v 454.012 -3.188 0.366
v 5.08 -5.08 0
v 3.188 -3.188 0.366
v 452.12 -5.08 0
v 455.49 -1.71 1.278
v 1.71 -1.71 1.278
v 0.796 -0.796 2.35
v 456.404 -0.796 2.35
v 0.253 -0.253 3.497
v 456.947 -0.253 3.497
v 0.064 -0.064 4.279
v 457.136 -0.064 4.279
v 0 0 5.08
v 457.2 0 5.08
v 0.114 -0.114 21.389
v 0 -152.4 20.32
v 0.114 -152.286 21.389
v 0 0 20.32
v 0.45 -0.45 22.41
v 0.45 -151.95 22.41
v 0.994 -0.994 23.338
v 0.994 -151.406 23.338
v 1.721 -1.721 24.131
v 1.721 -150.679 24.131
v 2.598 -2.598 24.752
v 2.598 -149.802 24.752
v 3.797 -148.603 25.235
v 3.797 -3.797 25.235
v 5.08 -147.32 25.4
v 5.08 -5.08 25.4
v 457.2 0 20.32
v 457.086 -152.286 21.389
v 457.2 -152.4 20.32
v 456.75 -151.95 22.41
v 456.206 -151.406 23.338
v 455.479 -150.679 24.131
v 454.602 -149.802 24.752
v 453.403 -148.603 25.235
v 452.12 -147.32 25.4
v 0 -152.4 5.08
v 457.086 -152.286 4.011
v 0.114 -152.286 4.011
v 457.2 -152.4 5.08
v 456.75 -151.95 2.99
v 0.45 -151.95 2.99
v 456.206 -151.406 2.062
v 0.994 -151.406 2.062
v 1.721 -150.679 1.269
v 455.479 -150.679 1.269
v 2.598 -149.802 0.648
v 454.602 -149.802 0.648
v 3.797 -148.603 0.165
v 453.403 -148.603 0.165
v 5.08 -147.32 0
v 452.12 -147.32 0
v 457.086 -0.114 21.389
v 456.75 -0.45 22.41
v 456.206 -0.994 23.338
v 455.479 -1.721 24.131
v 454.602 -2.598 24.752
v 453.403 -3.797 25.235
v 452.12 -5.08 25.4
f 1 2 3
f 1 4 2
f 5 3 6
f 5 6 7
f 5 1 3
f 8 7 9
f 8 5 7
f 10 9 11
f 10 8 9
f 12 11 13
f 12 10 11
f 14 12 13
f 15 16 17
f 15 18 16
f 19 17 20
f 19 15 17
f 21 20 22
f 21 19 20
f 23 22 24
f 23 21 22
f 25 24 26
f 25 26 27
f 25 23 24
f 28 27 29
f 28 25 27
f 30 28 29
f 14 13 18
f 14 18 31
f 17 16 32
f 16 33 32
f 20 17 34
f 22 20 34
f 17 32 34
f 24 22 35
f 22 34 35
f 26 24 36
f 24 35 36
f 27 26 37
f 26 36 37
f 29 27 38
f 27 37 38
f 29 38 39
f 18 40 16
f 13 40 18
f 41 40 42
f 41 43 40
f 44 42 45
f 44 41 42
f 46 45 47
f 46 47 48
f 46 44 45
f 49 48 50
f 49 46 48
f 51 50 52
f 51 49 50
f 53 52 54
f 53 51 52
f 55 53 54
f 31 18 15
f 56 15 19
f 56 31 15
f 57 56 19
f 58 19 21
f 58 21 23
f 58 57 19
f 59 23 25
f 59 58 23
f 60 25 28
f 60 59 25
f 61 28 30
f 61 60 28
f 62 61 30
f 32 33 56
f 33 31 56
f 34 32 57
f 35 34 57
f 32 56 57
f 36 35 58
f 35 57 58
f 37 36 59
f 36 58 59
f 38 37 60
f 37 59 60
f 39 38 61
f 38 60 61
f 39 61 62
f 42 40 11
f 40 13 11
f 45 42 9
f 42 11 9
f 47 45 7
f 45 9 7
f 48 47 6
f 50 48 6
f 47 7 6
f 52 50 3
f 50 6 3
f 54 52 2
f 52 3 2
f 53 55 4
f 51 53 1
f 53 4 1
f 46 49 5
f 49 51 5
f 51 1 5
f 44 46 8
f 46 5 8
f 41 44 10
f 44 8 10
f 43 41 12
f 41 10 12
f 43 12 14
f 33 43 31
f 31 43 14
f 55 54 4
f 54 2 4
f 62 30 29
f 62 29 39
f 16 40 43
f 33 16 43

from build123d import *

# Parameters (mm, degrees)
F0_W     = 457.2
F0_H     = 152.4
F1_DEPTH = 25.4
F2_R     = 5.08
F3_R     = 5.08


with BuildPart() as f1:
    # F0 (on Top) → F1 (new body)
    with BuildSketch(Plane.XY):
        with Locations((228.6, -76.2)):
            Rectangle(F0_W, F0_H)
    extrude(amount=F1_DEPTH)

    # F2
    f2_edges = [f1.edges().sort_by_distance(p)[0] for p in [
        (0, -76.2, 25.4),
        (228.6, -152.4, 25.4),
        (228.6, 0, 25.4),
        (457.2, -76.2, 25.4),
    ]]
    fillet(f2_edges, radius=F2_R)

    # F3
    f3_edges = [f1.edges().sort_by_distance(p)[0] for p in [
        (228.6, -152.4, 0),
        (457.2, -76.2, 0),
        (228.6, 0, 0),
        (0, -76.2, 0),
    ]]
    fillet(f3_edges, radius=F3_R)


solid = f1.part
